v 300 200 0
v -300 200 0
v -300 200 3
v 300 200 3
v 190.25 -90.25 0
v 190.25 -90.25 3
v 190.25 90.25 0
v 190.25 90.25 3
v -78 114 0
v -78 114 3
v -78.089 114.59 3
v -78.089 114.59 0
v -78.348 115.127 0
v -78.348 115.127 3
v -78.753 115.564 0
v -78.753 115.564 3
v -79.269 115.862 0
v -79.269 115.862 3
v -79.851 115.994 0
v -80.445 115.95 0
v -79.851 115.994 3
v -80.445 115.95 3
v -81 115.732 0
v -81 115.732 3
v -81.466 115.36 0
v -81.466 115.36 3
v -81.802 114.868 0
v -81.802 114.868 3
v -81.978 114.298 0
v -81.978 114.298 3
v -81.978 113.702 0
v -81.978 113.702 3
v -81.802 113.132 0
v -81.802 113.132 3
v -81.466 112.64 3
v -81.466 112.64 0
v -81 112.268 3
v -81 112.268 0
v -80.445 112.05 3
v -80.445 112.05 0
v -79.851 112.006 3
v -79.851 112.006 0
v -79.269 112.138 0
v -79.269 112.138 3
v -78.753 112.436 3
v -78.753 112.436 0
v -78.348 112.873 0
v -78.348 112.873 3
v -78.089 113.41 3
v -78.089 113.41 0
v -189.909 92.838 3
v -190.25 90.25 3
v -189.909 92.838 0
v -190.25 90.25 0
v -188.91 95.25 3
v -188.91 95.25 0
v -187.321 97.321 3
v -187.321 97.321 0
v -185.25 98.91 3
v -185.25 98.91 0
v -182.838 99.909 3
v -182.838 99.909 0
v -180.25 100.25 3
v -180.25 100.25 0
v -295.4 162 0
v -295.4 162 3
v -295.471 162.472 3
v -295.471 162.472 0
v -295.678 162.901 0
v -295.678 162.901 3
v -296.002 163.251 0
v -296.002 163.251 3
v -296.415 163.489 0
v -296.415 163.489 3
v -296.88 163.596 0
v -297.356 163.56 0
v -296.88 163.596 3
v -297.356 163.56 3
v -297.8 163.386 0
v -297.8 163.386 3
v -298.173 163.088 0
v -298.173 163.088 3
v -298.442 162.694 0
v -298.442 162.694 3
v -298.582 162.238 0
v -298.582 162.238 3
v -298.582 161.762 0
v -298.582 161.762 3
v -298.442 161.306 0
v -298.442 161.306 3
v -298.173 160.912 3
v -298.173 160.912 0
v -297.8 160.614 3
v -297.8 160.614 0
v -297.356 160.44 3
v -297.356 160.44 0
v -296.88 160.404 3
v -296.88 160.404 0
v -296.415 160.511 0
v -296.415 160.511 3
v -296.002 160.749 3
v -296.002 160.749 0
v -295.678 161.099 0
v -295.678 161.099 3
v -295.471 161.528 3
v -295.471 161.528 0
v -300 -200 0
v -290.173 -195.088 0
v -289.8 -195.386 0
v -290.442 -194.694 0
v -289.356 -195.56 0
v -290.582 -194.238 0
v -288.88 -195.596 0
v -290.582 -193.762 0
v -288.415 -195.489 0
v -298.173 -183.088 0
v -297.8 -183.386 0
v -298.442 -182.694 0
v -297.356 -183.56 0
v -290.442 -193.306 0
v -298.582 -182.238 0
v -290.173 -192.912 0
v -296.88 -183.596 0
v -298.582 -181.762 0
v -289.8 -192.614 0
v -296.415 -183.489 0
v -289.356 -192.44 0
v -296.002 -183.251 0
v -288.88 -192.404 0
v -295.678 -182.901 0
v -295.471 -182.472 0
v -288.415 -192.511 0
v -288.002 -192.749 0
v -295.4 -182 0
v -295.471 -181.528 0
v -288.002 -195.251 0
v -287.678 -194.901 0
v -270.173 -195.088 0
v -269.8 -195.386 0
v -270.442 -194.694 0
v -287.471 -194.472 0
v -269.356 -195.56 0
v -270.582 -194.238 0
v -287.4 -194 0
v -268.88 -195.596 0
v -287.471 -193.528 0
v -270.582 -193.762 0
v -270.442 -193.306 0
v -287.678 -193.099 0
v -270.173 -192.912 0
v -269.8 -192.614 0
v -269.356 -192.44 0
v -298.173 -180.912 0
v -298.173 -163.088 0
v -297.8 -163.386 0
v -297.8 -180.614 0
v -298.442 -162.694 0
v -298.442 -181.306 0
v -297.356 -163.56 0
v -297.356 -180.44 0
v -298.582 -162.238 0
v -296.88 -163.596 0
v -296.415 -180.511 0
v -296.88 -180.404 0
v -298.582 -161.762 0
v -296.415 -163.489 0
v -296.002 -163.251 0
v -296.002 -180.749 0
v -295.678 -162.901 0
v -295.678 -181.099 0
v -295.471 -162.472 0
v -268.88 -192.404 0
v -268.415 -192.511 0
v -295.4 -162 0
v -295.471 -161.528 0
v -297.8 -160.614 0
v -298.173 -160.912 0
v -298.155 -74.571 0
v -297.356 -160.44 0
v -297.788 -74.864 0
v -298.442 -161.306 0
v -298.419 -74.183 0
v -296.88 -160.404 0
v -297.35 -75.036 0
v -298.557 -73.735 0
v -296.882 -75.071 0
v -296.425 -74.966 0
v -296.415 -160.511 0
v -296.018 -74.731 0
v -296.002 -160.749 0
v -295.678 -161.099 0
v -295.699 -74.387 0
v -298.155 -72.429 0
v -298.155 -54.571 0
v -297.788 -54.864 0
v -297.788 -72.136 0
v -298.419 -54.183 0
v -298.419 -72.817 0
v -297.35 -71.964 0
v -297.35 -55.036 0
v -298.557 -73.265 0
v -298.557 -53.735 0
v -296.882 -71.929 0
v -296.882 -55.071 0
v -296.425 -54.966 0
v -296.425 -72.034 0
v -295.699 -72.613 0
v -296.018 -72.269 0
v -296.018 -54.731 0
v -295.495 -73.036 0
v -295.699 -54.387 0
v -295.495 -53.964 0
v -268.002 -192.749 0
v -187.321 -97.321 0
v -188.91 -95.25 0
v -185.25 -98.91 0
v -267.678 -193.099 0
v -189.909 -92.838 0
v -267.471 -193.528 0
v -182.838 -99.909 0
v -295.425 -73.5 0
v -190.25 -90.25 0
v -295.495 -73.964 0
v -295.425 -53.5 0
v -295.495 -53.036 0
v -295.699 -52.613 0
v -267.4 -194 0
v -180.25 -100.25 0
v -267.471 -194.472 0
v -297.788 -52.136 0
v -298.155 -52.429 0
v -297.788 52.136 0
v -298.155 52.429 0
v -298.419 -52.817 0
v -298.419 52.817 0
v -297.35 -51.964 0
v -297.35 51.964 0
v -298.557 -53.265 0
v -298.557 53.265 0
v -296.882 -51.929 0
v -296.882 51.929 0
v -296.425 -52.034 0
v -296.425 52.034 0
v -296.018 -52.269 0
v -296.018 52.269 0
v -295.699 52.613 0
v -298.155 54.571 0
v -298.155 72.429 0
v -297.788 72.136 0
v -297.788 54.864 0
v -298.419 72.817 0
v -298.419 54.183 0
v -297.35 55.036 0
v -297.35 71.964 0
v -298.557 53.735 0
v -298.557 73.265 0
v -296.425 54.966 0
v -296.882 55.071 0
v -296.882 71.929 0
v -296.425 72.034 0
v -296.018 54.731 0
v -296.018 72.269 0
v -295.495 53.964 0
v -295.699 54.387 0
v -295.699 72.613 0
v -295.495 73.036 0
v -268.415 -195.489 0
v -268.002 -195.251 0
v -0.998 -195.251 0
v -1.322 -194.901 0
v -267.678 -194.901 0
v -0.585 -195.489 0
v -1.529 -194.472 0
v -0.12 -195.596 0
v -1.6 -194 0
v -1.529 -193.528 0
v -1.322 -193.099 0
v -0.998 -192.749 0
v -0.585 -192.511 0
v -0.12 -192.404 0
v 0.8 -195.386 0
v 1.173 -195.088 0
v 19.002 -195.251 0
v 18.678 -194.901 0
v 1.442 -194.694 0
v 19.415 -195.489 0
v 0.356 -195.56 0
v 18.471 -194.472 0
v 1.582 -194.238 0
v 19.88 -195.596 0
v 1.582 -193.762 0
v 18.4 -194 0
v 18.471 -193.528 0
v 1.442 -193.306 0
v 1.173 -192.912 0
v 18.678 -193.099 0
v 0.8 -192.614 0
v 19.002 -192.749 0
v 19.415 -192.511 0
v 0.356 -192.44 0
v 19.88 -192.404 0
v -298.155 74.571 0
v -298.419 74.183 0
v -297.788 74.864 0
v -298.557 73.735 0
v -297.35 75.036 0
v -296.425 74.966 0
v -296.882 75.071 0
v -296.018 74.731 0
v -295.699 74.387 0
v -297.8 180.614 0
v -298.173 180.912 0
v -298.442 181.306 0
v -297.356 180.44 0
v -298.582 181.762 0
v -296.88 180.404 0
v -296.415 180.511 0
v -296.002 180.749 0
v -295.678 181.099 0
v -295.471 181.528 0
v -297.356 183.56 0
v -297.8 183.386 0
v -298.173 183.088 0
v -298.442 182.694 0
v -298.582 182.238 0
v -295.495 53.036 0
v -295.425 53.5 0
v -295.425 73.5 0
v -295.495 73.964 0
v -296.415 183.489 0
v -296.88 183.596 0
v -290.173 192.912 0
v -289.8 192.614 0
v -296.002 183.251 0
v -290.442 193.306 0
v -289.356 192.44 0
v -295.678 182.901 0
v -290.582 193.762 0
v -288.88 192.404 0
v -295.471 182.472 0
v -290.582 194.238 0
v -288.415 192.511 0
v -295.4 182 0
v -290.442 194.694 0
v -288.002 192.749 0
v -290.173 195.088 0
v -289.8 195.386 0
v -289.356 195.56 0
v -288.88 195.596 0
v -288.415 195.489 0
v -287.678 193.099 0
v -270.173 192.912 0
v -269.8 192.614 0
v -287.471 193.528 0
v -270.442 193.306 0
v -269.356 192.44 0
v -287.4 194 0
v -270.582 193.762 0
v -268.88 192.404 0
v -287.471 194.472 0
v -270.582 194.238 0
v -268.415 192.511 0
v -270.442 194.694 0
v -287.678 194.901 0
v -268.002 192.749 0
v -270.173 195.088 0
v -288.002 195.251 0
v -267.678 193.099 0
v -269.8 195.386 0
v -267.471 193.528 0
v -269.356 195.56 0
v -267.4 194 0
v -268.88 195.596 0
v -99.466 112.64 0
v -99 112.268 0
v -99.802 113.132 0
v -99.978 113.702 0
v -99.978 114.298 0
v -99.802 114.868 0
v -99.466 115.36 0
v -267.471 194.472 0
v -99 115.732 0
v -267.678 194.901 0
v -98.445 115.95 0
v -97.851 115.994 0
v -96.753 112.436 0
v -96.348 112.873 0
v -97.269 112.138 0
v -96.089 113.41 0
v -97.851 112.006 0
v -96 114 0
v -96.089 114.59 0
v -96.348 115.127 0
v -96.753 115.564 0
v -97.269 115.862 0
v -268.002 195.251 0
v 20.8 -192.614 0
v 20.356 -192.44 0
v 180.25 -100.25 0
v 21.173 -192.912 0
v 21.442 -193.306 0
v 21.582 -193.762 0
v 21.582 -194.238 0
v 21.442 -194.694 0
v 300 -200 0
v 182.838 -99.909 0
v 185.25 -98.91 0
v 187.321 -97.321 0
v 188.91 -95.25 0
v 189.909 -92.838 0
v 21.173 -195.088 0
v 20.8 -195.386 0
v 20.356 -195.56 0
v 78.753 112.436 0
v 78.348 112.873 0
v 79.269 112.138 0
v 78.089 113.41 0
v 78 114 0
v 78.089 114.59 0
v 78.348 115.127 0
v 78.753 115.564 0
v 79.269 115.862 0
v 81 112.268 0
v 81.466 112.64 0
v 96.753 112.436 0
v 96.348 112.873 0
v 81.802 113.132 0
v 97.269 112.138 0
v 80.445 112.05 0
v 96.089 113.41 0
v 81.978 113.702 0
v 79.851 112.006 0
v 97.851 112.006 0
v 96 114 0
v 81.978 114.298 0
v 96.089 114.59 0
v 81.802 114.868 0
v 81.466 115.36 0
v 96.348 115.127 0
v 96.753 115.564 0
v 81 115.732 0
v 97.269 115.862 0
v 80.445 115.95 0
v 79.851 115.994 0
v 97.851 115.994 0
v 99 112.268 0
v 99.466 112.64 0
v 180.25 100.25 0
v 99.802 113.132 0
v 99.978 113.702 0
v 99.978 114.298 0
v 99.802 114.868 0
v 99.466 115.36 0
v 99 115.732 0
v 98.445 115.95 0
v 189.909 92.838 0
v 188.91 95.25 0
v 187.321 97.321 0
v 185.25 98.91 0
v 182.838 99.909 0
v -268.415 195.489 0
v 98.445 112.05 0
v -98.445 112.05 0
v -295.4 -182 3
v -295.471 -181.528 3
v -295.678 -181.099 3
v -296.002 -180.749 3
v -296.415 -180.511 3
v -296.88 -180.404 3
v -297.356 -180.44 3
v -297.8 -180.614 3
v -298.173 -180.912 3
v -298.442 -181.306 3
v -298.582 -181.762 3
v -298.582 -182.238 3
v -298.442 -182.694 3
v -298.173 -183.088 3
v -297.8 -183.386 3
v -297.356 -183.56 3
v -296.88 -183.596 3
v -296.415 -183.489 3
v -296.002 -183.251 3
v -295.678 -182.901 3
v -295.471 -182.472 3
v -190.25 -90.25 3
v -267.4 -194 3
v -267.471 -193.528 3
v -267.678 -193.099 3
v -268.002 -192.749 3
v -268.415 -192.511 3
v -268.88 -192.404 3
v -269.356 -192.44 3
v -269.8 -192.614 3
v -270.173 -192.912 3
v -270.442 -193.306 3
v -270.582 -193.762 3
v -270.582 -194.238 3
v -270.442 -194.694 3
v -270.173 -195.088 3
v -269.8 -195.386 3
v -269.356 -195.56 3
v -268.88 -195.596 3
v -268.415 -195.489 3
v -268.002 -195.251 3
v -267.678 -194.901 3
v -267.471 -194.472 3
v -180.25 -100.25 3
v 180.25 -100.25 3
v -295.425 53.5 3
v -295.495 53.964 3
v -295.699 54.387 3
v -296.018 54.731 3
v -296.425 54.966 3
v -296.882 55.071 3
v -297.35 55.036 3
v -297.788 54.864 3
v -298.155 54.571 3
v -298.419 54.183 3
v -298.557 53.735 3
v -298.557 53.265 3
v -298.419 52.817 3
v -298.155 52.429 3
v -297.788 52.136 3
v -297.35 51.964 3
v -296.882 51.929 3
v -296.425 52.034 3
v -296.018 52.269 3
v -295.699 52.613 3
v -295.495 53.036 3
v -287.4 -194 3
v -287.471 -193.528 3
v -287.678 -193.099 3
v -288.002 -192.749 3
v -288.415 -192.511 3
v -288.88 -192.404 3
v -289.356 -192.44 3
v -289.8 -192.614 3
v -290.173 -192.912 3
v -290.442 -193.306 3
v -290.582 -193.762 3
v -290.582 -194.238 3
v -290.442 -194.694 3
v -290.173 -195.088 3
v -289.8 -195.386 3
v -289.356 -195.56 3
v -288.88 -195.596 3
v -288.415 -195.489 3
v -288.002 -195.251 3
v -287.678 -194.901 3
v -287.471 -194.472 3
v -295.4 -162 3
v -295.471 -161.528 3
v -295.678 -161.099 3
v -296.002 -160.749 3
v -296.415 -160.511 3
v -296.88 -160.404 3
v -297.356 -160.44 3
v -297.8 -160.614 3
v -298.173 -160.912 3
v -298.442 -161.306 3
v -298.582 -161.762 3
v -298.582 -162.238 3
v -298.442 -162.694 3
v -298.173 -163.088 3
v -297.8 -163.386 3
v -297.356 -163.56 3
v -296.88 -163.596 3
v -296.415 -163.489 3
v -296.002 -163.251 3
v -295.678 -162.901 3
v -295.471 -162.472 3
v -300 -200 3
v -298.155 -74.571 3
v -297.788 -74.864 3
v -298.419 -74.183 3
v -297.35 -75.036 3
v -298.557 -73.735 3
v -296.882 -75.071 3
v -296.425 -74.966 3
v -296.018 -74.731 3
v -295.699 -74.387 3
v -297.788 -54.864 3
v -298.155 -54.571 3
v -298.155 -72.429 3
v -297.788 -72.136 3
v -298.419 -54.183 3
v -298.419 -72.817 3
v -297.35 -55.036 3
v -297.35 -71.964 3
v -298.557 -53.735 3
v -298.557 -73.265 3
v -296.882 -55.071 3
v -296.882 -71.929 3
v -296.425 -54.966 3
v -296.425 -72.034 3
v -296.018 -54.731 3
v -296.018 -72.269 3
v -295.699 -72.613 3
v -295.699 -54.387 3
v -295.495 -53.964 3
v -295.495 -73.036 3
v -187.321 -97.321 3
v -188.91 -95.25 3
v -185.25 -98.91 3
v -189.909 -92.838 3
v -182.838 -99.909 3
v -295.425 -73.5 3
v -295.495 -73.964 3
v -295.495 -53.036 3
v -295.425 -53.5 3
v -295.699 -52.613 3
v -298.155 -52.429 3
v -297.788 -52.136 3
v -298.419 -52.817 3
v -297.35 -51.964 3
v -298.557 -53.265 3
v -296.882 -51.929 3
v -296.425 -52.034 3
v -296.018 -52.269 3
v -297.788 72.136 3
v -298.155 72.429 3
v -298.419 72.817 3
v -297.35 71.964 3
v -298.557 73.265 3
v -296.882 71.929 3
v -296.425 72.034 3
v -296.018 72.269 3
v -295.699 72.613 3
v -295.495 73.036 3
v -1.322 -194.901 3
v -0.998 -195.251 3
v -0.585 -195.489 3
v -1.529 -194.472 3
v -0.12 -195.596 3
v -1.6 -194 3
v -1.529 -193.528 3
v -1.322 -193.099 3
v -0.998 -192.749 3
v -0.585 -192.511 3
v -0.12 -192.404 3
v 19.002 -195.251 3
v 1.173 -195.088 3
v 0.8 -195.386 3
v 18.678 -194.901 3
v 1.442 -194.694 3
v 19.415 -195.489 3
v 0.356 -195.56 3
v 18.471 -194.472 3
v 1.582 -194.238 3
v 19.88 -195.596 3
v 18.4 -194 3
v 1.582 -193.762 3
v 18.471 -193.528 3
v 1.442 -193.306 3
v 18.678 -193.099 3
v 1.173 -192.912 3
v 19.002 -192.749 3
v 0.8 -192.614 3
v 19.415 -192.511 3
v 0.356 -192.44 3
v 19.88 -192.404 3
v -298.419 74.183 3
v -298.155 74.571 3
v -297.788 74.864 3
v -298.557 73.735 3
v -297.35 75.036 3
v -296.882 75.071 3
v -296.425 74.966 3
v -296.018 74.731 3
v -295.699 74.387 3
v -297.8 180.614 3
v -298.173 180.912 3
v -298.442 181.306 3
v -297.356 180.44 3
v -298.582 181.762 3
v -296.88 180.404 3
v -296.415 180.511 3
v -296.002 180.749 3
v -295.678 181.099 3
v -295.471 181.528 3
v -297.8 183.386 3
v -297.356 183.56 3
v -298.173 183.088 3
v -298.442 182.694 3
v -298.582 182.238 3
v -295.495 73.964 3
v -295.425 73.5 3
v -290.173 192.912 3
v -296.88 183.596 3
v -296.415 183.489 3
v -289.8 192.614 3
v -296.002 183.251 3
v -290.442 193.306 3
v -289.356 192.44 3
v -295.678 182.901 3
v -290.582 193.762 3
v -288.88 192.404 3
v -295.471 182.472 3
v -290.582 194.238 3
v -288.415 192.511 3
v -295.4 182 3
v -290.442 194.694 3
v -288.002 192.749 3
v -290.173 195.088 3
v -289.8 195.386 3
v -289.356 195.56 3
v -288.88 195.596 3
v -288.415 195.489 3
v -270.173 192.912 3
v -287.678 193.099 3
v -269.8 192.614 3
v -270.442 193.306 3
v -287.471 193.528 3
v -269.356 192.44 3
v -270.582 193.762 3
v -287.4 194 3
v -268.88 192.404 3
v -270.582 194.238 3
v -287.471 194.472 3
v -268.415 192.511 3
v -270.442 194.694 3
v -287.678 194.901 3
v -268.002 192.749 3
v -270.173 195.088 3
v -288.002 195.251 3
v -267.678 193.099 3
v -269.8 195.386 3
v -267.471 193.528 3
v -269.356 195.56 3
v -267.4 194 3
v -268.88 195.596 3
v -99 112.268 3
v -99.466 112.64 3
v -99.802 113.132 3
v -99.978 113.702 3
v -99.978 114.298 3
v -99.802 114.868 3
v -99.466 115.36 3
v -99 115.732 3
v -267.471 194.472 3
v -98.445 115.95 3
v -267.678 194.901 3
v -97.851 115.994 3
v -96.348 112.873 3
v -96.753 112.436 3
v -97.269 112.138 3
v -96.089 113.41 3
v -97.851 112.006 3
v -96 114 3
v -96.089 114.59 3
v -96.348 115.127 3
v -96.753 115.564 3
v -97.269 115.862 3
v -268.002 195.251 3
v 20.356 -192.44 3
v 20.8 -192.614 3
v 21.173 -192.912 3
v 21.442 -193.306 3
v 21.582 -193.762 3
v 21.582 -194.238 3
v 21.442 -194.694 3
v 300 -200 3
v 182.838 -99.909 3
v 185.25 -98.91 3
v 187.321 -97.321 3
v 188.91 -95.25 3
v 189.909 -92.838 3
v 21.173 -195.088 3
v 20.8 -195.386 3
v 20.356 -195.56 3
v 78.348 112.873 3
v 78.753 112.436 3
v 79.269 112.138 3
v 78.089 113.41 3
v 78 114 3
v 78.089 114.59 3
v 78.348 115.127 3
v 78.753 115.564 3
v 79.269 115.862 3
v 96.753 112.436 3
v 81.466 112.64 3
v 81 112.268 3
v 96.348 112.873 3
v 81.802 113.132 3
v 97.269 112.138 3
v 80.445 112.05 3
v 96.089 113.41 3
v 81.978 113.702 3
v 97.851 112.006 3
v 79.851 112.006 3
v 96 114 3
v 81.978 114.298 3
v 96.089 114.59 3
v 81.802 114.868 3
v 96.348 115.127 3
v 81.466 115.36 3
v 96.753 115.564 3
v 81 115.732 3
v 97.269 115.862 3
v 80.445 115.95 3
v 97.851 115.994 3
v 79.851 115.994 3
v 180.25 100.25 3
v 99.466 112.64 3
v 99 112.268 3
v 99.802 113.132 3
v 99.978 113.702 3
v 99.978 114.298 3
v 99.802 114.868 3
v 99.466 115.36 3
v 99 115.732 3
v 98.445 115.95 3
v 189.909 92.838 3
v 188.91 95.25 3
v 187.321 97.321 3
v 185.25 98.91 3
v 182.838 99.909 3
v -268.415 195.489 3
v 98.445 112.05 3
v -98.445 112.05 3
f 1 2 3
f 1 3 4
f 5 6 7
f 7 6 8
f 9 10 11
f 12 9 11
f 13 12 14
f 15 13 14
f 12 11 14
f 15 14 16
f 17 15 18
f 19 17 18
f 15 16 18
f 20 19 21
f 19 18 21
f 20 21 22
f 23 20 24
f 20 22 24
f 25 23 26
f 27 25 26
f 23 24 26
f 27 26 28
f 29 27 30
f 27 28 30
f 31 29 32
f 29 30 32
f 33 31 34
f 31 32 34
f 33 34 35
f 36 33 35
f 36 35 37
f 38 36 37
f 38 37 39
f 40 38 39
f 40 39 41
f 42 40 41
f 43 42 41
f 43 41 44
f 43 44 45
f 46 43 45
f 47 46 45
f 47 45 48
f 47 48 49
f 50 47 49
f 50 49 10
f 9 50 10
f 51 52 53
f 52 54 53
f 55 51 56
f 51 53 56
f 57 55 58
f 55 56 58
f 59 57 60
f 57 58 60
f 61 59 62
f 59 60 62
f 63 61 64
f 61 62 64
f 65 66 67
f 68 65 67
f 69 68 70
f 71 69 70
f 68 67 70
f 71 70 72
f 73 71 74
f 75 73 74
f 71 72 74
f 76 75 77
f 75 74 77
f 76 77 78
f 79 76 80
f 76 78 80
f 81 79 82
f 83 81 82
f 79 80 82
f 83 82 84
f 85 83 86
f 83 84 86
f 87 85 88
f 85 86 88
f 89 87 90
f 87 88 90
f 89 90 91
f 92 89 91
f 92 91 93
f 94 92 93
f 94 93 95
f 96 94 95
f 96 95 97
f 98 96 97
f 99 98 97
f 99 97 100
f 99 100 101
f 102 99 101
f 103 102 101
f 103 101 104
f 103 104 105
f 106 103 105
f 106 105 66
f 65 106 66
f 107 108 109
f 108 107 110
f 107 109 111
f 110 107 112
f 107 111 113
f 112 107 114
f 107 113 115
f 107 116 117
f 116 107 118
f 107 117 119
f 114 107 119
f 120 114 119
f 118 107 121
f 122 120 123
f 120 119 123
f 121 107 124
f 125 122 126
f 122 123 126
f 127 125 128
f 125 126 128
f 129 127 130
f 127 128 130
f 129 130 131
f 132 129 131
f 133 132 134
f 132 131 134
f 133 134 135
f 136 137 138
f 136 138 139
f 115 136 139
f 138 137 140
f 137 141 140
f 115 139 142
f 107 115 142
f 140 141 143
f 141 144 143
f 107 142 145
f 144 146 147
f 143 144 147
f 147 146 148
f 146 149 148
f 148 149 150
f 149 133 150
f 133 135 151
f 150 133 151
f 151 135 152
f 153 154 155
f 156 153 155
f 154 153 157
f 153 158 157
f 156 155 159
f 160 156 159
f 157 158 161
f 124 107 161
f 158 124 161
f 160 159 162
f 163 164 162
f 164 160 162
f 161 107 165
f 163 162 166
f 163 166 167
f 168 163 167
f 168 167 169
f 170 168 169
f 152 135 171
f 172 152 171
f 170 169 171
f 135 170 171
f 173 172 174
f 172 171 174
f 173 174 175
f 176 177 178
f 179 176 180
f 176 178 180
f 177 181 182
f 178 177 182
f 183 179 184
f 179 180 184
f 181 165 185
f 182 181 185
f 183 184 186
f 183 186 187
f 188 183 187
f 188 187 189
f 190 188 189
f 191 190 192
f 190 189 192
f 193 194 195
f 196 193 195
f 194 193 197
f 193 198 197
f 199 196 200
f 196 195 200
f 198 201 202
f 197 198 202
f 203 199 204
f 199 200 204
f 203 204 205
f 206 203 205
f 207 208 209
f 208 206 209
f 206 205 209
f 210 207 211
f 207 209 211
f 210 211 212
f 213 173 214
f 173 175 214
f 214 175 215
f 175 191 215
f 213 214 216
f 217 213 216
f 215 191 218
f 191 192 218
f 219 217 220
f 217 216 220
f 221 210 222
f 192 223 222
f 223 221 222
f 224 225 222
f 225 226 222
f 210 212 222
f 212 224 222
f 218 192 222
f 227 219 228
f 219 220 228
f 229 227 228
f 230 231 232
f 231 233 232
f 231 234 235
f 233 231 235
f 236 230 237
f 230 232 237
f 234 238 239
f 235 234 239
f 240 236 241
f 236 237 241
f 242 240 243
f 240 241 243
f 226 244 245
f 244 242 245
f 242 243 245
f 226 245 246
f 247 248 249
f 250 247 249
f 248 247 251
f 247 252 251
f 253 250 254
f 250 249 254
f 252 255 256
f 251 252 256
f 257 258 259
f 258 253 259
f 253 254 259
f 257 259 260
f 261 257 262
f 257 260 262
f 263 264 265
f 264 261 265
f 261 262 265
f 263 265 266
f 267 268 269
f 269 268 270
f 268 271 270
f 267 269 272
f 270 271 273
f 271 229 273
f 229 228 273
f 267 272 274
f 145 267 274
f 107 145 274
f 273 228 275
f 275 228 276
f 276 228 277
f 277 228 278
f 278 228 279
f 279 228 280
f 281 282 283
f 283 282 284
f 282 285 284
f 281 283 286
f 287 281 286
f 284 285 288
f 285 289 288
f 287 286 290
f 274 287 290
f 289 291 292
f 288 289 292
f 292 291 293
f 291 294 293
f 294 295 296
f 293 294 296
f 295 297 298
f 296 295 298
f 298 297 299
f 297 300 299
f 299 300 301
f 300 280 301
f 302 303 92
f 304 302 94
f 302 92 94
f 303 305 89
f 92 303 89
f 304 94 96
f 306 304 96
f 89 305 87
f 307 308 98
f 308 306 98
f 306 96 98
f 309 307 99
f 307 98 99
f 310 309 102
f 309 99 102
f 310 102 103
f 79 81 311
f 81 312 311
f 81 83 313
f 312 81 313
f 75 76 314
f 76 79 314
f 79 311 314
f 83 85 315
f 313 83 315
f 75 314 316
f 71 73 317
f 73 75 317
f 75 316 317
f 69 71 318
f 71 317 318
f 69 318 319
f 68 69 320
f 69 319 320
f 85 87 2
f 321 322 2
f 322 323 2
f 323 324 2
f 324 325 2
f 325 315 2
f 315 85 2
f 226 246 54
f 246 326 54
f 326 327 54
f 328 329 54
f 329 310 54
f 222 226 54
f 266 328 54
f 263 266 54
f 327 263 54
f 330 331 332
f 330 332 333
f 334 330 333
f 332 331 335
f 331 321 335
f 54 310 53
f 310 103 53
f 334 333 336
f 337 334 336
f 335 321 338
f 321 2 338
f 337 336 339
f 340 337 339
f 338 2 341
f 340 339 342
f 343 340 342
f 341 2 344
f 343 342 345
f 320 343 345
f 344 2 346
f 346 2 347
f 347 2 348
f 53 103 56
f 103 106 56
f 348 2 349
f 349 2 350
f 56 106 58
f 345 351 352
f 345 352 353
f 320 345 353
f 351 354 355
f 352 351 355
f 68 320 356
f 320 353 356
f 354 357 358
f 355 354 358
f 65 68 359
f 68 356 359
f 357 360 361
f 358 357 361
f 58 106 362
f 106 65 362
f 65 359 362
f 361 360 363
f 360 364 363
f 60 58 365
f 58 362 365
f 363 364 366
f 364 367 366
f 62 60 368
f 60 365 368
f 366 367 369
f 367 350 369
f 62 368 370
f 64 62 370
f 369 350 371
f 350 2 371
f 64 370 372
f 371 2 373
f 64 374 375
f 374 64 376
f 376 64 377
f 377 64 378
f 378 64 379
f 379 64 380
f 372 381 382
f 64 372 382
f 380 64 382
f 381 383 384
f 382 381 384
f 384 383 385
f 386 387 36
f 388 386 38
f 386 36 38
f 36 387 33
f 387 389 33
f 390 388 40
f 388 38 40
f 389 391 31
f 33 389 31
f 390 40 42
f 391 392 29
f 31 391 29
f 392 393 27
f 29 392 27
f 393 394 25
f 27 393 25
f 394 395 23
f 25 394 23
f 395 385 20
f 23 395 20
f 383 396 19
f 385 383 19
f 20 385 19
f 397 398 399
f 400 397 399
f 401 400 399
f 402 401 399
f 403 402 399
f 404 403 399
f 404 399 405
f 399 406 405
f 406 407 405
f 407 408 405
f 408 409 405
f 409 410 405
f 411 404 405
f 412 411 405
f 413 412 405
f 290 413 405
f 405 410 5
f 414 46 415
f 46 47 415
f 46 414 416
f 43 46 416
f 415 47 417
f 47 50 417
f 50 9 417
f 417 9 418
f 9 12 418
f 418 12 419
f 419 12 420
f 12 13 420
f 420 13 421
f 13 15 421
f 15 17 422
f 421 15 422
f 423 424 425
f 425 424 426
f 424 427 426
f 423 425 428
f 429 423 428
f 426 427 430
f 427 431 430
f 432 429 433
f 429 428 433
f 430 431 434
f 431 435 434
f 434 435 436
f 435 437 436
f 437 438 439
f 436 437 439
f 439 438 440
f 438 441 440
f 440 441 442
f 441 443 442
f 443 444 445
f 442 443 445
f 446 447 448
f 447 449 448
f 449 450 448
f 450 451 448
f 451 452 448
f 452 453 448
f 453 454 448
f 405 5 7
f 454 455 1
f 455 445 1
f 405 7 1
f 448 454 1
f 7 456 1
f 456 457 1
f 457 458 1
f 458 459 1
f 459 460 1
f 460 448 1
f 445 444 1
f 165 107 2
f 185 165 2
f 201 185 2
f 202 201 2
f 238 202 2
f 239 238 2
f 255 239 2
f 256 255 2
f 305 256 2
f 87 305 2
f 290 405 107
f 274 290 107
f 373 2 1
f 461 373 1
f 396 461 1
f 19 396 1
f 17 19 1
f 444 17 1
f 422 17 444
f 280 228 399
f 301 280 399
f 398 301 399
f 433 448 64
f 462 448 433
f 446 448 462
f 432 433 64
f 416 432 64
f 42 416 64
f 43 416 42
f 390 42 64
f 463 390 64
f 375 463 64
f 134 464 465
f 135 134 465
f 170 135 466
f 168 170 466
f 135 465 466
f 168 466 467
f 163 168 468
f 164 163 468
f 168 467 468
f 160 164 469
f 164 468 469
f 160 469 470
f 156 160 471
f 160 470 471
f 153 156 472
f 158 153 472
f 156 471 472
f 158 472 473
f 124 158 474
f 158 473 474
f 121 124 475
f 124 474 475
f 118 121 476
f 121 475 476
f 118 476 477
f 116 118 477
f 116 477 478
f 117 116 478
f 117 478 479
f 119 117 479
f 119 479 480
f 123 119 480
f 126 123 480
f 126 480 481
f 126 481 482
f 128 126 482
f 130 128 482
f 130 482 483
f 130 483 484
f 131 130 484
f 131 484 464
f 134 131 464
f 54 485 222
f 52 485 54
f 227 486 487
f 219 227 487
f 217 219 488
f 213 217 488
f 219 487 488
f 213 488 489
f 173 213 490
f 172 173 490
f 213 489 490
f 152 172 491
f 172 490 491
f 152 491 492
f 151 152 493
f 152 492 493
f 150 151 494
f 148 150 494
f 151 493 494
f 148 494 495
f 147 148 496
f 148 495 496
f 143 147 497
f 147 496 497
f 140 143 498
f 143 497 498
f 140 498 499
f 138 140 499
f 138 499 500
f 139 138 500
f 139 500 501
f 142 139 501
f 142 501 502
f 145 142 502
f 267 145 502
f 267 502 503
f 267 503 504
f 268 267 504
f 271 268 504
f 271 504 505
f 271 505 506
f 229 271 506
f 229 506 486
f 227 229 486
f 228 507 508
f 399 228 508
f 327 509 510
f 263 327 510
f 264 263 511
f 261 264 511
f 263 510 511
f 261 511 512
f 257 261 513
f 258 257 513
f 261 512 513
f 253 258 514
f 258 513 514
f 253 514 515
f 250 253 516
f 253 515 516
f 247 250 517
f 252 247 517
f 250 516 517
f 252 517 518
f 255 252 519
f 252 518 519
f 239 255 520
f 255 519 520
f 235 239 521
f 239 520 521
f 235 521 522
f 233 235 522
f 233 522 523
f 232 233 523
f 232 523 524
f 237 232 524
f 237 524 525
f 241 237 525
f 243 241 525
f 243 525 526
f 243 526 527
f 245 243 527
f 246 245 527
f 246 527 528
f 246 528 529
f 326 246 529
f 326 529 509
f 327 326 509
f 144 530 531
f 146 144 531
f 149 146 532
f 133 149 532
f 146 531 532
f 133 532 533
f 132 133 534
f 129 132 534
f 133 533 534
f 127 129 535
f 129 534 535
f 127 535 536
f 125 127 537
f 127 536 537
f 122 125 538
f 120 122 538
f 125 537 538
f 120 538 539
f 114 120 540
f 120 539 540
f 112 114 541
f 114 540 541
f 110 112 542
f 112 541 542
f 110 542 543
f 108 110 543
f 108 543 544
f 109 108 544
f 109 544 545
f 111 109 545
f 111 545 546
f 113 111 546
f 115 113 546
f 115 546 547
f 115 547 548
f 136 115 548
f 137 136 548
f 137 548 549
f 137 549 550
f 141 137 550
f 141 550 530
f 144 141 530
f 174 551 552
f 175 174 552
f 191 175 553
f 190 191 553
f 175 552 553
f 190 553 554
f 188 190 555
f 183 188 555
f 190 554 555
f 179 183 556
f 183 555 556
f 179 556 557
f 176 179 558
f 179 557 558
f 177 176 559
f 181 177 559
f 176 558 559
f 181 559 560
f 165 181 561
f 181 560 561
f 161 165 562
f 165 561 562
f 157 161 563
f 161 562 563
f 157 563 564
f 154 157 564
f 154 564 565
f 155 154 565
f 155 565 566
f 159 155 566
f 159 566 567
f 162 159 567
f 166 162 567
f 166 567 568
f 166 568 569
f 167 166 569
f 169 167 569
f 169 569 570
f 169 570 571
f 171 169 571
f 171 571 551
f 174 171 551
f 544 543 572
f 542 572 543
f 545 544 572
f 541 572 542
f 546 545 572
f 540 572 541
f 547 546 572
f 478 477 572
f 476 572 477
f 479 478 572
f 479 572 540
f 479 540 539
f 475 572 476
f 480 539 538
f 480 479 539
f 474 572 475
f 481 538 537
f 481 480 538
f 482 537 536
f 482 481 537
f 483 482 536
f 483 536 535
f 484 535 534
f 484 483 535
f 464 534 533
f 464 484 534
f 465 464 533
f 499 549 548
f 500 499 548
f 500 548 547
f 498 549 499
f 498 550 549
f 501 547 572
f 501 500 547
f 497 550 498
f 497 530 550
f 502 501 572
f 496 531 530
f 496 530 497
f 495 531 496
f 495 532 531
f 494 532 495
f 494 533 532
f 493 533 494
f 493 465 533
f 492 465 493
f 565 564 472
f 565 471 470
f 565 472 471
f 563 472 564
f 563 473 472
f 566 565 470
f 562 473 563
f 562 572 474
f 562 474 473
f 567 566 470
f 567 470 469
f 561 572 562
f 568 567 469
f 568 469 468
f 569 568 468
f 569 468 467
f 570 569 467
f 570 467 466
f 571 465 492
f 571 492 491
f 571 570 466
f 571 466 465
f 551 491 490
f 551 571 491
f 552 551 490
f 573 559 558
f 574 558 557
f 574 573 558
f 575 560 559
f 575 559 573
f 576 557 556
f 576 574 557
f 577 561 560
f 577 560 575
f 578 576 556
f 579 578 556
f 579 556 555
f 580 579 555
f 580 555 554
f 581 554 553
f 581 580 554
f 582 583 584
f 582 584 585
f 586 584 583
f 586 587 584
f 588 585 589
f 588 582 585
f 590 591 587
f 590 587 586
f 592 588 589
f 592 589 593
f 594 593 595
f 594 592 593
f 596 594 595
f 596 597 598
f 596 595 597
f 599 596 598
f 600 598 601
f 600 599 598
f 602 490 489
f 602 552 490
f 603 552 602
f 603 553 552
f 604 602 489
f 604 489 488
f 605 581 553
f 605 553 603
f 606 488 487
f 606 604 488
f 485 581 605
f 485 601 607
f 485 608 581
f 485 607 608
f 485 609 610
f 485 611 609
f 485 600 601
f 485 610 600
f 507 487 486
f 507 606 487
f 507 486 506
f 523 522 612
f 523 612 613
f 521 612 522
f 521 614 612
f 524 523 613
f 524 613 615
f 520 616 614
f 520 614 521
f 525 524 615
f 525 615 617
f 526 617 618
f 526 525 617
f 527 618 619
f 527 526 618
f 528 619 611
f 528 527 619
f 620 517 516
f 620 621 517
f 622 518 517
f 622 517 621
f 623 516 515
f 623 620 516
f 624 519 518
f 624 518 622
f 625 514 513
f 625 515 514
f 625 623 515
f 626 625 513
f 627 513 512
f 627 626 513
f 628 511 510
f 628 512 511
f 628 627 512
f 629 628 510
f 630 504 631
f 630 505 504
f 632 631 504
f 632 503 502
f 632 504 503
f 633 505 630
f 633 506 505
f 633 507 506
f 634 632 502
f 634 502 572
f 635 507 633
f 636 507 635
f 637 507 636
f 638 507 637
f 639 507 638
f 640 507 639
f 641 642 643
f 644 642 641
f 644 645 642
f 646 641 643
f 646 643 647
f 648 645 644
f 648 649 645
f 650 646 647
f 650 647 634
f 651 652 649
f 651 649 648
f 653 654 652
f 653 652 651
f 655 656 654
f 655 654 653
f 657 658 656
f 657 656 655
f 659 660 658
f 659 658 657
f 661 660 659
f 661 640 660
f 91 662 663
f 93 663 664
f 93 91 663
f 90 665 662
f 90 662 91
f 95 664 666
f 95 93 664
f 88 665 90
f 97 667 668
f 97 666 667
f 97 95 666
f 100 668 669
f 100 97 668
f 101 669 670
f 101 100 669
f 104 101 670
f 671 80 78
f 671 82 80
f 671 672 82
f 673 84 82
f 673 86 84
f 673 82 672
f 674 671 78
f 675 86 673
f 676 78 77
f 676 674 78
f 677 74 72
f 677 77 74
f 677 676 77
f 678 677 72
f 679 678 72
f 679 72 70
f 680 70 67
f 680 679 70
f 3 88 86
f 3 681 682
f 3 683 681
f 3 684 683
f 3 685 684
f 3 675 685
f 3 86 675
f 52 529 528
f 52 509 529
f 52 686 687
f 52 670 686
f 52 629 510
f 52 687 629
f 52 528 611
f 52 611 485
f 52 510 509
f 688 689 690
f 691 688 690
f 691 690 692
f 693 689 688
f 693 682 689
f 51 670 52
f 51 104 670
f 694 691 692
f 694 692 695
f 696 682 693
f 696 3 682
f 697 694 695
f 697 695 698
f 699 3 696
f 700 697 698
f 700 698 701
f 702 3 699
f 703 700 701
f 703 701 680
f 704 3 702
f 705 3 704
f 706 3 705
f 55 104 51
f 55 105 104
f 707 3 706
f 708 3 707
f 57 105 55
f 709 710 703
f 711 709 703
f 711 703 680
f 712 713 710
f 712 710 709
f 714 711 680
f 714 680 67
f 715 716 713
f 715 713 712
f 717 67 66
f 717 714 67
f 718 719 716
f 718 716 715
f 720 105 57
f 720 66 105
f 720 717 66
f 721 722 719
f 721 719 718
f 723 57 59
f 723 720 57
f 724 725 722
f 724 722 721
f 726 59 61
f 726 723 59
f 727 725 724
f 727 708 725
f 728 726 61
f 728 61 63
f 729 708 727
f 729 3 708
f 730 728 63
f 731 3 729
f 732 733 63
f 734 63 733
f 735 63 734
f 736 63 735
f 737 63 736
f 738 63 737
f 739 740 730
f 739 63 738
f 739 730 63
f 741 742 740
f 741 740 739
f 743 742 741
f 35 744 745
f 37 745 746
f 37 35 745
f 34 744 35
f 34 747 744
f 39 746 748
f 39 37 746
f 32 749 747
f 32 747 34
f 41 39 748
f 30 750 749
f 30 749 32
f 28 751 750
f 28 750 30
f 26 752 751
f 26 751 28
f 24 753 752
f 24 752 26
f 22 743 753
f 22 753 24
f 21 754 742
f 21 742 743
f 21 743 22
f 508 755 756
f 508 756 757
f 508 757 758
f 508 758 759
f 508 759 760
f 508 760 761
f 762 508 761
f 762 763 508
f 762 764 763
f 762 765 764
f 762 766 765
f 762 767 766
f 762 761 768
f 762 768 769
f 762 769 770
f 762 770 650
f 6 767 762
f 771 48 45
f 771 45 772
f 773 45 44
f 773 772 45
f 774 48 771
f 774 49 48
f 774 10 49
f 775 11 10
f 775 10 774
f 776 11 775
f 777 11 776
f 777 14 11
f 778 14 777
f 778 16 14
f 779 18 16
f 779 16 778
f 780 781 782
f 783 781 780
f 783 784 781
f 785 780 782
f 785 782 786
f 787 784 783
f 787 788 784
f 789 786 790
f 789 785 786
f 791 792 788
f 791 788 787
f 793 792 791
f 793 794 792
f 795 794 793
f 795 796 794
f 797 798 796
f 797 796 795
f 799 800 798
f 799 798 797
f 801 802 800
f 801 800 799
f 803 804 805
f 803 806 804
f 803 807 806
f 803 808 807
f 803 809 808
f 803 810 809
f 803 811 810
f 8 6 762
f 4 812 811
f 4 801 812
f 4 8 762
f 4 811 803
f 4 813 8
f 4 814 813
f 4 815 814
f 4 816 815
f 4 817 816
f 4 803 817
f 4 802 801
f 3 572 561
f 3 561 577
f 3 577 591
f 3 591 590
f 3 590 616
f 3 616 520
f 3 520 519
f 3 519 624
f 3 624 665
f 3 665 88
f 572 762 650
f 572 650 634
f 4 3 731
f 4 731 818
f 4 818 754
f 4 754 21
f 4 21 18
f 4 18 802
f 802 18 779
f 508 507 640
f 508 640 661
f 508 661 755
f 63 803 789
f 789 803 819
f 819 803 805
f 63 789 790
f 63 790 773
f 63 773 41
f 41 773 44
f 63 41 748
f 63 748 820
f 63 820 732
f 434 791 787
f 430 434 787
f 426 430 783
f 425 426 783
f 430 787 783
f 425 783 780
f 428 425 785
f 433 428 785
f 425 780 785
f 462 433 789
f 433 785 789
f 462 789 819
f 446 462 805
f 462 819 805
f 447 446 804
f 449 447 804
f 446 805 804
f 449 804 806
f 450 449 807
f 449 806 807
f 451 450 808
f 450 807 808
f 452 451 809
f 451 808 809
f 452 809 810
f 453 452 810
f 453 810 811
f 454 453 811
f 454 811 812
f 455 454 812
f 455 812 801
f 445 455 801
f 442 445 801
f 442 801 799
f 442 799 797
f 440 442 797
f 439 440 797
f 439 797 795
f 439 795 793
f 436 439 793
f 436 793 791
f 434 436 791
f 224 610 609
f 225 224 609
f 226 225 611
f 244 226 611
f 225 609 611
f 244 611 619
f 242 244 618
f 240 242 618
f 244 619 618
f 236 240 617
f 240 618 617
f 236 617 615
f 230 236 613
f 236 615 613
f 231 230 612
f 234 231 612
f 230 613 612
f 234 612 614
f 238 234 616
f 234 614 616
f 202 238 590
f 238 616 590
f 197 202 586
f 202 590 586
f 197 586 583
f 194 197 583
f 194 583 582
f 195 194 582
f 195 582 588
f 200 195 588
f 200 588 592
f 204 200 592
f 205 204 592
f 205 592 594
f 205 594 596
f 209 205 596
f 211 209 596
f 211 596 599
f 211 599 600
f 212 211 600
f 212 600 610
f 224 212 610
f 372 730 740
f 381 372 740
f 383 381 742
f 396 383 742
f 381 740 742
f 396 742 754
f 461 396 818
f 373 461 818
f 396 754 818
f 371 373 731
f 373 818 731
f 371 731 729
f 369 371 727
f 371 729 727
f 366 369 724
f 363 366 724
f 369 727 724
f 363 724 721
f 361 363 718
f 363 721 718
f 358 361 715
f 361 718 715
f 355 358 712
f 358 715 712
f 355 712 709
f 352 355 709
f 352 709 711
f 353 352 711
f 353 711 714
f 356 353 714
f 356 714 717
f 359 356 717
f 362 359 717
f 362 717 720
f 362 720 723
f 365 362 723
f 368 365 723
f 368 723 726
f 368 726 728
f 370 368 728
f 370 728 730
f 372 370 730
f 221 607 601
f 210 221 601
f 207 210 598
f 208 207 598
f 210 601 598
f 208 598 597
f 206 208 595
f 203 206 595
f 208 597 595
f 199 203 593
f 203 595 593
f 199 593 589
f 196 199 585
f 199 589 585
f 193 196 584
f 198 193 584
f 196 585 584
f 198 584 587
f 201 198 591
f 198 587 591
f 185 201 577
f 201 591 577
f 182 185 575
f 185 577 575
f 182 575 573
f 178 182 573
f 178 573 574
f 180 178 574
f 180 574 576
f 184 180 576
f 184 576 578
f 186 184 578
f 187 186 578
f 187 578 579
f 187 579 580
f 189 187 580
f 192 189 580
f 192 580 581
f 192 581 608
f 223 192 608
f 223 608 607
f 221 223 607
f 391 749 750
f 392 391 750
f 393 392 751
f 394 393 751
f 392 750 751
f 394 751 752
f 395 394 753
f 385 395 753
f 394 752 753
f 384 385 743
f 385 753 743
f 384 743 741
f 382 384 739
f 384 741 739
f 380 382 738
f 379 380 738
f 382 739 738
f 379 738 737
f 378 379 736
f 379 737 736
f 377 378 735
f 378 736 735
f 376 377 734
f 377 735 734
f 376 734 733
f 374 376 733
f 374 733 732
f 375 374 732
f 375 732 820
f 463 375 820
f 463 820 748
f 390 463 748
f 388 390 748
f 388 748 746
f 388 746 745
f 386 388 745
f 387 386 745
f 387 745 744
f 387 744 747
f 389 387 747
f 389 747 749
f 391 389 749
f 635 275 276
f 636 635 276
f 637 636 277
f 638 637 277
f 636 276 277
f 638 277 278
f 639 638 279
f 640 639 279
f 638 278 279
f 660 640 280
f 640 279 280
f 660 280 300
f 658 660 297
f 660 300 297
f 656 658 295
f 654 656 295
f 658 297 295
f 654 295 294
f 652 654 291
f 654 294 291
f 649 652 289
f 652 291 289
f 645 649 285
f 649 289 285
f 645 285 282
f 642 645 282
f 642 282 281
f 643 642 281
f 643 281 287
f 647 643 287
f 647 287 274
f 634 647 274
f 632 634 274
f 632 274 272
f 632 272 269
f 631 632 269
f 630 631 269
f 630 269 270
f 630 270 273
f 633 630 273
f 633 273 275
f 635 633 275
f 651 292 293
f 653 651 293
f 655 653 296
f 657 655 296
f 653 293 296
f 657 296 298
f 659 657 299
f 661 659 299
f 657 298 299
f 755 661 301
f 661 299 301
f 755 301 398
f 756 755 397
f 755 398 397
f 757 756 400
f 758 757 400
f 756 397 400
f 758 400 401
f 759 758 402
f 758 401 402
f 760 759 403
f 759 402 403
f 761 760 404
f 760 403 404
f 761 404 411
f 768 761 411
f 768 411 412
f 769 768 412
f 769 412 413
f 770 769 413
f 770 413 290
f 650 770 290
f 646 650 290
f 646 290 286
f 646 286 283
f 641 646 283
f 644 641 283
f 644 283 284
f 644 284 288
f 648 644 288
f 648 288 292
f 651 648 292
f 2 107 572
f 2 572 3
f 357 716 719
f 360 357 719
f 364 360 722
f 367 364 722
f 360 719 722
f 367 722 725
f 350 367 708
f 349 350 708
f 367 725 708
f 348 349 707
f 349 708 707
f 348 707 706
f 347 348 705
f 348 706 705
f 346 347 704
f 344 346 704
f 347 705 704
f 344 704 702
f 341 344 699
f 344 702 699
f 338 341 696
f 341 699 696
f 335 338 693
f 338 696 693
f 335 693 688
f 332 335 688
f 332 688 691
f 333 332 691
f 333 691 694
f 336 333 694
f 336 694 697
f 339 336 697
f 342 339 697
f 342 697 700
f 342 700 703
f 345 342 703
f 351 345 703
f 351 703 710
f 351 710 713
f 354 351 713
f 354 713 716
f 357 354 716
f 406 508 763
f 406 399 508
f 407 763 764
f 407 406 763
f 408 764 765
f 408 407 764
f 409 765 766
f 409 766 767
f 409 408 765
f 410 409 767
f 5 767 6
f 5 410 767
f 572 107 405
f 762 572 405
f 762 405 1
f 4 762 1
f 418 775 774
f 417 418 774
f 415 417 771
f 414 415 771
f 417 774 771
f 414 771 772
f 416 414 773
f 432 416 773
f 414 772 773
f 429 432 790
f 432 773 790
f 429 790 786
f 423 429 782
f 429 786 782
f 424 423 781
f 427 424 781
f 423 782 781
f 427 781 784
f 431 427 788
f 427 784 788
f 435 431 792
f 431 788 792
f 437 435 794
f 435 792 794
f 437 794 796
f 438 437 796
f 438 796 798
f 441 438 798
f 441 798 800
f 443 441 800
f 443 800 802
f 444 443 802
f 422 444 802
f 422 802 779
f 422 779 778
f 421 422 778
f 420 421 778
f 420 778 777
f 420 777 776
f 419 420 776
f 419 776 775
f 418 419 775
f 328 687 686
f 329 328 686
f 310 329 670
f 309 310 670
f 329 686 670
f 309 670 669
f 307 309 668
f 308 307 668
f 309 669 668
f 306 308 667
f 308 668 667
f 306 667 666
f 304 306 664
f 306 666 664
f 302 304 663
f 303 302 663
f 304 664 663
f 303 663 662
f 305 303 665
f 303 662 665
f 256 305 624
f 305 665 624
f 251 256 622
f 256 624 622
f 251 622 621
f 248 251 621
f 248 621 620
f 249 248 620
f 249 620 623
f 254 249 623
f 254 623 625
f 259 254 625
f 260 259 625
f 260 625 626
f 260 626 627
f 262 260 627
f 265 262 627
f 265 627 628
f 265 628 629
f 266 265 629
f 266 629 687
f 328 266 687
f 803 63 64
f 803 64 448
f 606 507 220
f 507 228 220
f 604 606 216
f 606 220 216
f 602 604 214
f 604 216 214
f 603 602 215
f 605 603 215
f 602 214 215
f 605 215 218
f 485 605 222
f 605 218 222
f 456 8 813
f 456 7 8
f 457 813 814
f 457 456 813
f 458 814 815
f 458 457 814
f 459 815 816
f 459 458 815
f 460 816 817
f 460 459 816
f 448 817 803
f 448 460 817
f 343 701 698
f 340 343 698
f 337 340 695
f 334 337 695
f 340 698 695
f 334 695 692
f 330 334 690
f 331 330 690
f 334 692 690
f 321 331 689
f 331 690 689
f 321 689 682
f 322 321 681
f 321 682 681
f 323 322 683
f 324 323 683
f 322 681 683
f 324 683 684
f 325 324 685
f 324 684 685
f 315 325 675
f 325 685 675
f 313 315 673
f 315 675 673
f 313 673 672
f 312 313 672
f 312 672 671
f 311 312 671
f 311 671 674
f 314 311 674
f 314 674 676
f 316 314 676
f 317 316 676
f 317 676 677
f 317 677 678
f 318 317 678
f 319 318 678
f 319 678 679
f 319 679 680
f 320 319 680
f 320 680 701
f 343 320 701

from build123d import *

# Parameters (mm, degrees)
SKETCH_1_W          = 600
SKETCH_1_H          = 400
EXTRUDE_1_DEPTH     = 3
SKETCH_2_R          = 1.6
CUT_EXTRUDE_1_DEPTH = 361.567608085
SKETCH_4_R          = 1.6
CUT_EXTRUDE_2_DEPTH = 361.567608085
SKETCH_6_R          = 1.6
CUT_EXTRUDE_3_DEPTH = 361.567608085
SKETCH_7_W          = 380.5
SKETCH_7_H          = 200.5
CUT_EXTRUDE_4_DEPTH = 361.567608085
SKETCH_8_R          = 1.575
CUT_EXTRUDE_5_DEPTH = 361.567608085
SKETCH_9_R          = 2
CUT_EXTRUDE_6_DEPTH = 361.567608085
FILLET_1_R          = 10


with BuildPart() as part:
    # 草图1 → 凸台-拉伸1 (new body)
    with BuildSketch(Plane.XY):
        Rectangle(SKETCH_1_W, SKETCH_1_H)
    extrude(amount=EXTRUDE_1_DEPTH)

    # 草图2 → 切除-拉伸1 (cut, through all)
    with BuildSketch(Plane.XY.offset(3)):
        with Locations((-297, 162)):
            Circle(SKETCH_2_R)
        with Locations((-297, 182)):
            Circle(SKETCH_2_R)
        with Locations((-289, 194)):
            Circle(SKETCH_2_R)
        with Locations((-269, 194)):
            Circle(SKETCH_2_R)
    extrude(amount=-CUT_EXTRUDE_1_DEPTH, mode=Mode.SUBTRACT)

    # 草图4 → 切除-拉伸2 (cut, through all)
    with BuildSketch(Plane.XY.offset(3)):
        with Locations((-297, -162)):
            Circle(SKETCH_4_R)
        with Locations((-297, -182)):
            Circle(SKETCH_4_R)
        with Locations((-289, -194)):
            Circle(SKETCH_4_R)
        with Locations((-269, -194)):
            Circle(SKETCH_4_R)
    extrude(amount=-CUT_EXTRUDE_2_DEPTH, mode=Mode.SUBTRACT)

    # 草图6 → 切除-拉伸3 (cut, through all)
    with BuildSketch(Plane(origin=(0, 0, 0), x_dir=(-1, 0, 0), z_dir=(0, 0, -1))):
        with Locations((0, -194)):
            Circle(SKETCH_6_R)
        with Locations((-20, -194)):
            Circle(SKETCH_6_R)
    extrude(amount=-CUT_EXTRUDE_3_DEPTH, mode=Mode.SUBTRACT)

    # 草图7 → 切除-拉伸4 (cut, through all)
    with BuildSketch(Plane.XY.offset(3)):
        Rectangle(SKETCH_7_W, SKETCH_7_H)
    extrude(amount=-CUT_EXTRUDE_4_DEPTH, mode=Mode.SUBTRACT)

    # 草图8 → 切除-拉伸5 (cut, through all)
    with BuildSketch(Plane.XY.offset(3)):
        with Locations((-297, 73.5)):
            Circle(SKETCH_8_R)
        with Locations((-297, 53.5)):
            Circle(SKETCH_8_R)
        with Locations((-297, -53.5)):
            Circle(SKETCH_8_R)
        with Locations((-297, -73.5)):
            Circle(SKETCH_8_R)
    extrude(amount=-CUT_EXTRUDE_5_DEPTH, mode=Mode.SUBTRACT)

    # 草图9 → 切除-拉伸6 (cut, through all)
    with BuildSketch(Plane.XY.offset(3)):
        with Locations((-98, 114)):
            Circle(SKETCH_9_R)
        with Locations((-80, 114)):
            Circle(SKETCH_9_R)
        with Locations(Location((80, 114, 0), (0, 0, 180))):
            Circle(SKETCH_9_R)
        with Locations(Location((98, 114, 0), (0, 0, 180))):
            Circle(SKETCH_9_R)
    extrude(amount=-CUT_EXTRUDE_6_DEPTH, mode=Mode.SUBTRACT)

    # 圆角1
    fillet_1_edges = [part.edges().sort_by_distance(p)[0] for p in [
        (190.25, 100.25, 1.5),
        (190.25, -100.25, 1.5),
        (-190.25, -100.25, 1.5),
        (-190.25, 100.25, 1.5),
    ]]
    fillet(fillet_1_edges, radius=FILLET_1_R)


solid = part.part
